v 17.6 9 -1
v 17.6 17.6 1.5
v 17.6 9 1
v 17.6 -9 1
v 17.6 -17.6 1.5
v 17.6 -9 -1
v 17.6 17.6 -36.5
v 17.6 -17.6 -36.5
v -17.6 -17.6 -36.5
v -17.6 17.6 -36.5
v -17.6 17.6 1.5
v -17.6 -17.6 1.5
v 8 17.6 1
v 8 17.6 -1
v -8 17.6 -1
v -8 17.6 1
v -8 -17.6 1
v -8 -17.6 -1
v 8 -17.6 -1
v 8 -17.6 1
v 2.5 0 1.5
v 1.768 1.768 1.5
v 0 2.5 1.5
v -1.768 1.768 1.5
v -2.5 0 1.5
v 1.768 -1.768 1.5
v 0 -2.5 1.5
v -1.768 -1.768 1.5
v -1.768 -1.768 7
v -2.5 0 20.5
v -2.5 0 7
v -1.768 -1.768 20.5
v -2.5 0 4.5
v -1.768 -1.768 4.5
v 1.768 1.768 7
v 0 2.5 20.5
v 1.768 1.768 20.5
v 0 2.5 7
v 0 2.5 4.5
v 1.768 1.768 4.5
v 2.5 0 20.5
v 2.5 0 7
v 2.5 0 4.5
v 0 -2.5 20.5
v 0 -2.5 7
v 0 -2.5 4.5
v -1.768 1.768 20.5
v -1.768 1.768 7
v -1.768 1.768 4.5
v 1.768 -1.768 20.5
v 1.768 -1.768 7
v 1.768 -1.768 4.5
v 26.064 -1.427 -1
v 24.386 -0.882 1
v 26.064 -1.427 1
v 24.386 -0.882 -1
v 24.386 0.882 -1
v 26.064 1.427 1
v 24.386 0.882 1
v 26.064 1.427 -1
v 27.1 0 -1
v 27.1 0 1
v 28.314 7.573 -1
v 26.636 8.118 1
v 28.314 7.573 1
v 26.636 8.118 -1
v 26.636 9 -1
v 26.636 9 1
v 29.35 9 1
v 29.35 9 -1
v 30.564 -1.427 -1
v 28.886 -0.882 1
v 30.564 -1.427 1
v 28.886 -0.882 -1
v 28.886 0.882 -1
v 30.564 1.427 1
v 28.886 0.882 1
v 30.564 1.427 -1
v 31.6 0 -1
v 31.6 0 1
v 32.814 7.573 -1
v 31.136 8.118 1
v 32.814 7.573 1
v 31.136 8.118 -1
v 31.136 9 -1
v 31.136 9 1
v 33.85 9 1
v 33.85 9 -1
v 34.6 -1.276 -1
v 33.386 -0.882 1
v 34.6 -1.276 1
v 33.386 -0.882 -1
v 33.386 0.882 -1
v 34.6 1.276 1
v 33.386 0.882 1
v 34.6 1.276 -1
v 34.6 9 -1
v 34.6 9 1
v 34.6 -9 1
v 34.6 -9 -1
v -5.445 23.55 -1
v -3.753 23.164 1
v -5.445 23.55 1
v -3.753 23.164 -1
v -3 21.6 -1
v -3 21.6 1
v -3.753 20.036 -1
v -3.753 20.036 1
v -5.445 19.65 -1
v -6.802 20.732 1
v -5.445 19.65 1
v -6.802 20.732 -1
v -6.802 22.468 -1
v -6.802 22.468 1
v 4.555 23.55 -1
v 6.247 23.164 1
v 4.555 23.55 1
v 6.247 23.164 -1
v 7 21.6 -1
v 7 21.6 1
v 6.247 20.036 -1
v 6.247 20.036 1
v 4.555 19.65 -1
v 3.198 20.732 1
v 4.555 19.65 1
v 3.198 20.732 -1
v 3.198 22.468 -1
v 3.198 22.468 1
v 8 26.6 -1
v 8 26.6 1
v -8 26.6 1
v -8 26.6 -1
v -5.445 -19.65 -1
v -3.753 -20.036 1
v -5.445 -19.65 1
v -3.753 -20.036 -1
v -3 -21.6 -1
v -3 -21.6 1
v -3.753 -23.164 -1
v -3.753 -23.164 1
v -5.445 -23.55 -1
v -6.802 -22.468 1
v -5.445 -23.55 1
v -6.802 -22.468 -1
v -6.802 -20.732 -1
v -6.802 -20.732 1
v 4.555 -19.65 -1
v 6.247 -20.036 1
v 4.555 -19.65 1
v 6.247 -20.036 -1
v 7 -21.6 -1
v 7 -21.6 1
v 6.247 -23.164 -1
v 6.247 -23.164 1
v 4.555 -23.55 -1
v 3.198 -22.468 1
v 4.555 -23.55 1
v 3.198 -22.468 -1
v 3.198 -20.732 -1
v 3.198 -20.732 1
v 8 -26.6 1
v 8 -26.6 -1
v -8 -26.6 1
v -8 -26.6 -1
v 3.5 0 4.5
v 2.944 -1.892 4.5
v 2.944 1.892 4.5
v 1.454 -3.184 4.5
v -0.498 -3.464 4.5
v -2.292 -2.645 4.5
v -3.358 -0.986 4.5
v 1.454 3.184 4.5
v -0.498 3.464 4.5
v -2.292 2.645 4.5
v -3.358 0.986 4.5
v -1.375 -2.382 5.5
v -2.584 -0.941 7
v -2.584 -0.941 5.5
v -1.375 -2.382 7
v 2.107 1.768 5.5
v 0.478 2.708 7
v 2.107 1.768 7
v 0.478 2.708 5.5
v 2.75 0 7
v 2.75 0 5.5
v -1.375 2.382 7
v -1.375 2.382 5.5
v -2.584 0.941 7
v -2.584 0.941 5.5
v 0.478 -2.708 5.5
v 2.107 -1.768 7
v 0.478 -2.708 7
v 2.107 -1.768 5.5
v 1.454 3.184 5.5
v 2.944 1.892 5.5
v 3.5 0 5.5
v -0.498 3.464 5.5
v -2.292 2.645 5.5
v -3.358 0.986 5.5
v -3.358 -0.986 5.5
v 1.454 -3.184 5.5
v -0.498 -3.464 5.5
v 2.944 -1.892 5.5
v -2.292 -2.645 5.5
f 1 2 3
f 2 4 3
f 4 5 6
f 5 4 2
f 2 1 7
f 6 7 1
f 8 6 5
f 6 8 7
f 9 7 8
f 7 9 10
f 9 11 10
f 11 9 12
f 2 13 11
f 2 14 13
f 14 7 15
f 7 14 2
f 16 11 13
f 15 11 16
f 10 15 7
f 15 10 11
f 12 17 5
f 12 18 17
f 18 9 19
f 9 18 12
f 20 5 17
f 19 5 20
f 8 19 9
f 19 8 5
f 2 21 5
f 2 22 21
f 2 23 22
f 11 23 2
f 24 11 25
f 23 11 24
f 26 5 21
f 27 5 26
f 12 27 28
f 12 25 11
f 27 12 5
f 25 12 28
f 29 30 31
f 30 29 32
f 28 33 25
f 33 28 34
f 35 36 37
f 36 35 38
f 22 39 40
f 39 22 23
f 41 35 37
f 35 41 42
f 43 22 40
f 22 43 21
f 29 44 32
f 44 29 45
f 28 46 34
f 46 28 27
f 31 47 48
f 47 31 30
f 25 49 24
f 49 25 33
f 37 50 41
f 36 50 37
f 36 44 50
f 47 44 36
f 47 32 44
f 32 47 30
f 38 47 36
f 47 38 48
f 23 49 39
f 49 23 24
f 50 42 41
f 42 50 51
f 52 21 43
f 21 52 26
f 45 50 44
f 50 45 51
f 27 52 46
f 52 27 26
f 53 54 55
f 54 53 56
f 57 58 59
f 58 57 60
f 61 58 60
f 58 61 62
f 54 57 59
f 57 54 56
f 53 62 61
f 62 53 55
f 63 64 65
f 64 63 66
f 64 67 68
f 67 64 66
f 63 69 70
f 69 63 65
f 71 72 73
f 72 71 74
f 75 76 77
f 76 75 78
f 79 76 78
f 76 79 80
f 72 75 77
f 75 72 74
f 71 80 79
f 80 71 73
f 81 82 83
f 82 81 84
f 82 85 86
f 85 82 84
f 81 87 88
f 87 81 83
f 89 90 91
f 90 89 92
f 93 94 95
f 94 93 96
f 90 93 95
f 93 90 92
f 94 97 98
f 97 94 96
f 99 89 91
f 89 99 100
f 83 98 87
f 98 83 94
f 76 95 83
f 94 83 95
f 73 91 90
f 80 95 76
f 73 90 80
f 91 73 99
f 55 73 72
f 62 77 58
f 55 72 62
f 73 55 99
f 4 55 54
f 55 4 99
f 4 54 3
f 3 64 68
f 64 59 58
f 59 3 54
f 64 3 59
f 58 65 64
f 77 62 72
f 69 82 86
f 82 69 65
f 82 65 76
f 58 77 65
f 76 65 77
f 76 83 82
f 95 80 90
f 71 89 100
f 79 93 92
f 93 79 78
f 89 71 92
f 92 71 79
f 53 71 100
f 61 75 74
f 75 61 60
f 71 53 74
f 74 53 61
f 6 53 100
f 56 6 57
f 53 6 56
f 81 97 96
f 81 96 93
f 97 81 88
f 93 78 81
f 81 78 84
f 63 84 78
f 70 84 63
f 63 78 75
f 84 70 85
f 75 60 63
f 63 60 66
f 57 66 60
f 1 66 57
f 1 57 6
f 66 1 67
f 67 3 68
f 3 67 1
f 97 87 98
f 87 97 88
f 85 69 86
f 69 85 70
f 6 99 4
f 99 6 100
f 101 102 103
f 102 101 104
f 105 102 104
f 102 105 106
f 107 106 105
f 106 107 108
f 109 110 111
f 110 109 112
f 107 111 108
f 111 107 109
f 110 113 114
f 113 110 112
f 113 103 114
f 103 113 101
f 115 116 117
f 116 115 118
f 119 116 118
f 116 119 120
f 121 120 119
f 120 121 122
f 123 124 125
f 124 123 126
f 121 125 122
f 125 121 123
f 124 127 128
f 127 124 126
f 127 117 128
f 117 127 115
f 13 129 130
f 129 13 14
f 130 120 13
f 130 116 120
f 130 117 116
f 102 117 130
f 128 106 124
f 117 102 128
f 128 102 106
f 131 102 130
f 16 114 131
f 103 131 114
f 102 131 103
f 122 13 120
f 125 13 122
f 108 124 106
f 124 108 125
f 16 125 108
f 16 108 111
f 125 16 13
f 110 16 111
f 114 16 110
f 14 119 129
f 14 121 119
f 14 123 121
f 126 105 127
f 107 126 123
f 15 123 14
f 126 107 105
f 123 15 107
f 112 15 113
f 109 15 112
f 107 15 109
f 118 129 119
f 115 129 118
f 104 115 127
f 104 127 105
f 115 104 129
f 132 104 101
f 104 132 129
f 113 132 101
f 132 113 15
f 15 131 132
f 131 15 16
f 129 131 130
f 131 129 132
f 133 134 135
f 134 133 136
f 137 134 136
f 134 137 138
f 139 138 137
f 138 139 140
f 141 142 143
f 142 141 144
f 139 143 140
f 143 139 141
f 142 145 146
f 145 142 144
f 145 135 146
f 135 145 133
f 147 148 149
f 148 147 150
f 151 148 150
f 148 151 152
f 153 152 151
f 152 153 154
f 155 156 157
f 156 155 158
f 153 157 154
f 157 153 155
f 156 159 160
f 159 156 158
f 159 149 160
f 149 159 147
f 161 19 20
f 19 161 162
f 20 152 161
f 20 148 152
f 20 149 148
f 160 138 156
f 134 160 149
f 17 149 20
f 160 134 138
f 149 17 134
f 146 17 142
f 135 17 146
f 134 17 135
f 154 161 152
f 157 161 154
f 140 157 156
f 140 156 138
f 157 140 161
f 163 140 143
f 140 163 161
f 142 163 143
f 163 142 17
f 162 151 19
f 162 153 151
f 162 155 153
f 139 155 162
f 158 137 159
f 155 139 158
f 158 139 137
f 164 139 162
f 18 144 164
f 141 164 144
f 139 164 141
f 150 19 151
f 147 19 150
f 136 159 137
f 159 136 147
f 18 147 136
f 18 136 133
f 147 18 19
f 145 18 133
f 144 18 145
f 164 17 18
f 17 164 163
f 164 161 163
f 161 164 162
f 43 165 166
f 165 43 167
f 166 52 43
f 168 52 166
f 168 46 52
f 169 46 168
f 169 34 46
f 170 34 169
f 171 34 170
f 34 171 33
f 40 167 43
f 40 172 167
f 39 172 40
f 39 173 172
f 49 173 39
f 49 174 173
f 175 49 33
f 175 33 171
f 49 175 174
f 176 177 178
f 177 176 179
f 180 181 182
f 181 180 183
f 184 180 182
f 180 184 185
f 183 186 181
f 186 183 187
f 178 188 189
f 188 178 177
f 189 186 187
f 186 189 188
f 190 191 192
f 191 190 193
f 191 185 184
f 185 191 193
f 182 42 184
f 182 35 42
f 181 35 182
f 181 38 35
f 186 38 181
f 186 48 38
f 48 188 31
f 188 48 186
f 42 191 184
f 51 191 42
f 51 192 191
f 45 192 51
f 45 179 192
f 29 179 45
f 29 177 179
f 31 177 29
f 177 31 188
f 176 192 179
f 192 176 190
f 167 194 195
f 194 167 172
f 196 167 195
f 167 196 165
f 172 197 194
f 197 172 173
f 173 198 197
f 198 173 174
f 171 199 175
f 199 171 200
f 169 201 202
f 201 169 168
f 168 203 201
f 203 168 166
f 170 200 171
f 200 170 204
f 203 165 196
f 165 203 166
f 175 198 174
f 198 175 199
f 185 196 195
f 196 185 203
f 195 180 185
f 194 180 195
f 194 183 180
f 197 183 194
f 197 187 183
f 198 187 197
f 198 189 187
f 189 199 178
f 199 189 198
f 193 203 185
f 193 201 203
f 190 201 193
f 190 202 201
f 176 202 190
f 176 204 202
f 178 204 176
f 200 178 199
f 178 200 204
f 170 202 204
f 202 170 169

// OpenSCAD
// Parameters
face_width = 35.2; //[17.6:70.4:0.1]
face_thickness = 3.0; //[1.5:6.0:0.1]
body_length = 36.0; //[18.0:72.0:0.1]
body_width = 35.2; //[17.6:70.4:0.1]
body_height = 35.2; //[17.6:70.4:0.1]
shaft_diameter = 5.0; //[2.5:10.0:0.1]
shaft_length = 20.0; //[10.0:40.0:0.1]
mounting_hole_spacing = 26.0; //[13.0:52.0:0.1]
mounting_hole_diameter = 3.5; //[2.0:6.0:0.1]
mounting_hole_depth = 6.0; //[3.0:12.0:0.1]
overlap = 1.0; //[0.5:2.0:0.1]
d_plug_length = 14.0; //[7.0:28.0:0.1]
d_plug_width = 10.0; //[5.0:20.0:0.1]
d_plug_rad = 2.0; //[1.0:4.0:0.1]
aux_plate_thickness = 2.0; //[1.0:5.0:0.1]
grill_width = 18.0; //[9.0:36.0:0.1]
grill_height = 18.0; //[9.0:36.0:0.1]
grill_hole_diameter = 3.0; //[1.5:6.0:0.1]
grill_gap = 2.0; //[1.0:5.0:0.1]
screw_shank_diameter = 3.0; //[2.0:6.0:0.1]
screw_length = 10.0; //[5.0:25.0:0.1]
screw_head_diameter = 5.5; //[3.0:12.0:0.1]
screw_head_height = 2.5; //[1.0:6.0:0.1]
washer_outer_diameter = 7.0; //[4.0:14.0:0.1]
washer_thickness = 1.0; //[0.5:2.5:0.1]
ttrack_plate_width = 16.0; //[8.0:32.0:0.1]
ttrack_plate_height = 10.0; //[5.0:20.0:0.1]
ttrack_hole_diameter = 4.0; //[2.0:8.0:0.1]
ttrack_hole_spacing = 10.0; //[5.0:20.0:0.1]
rail_plate_width = 16.0; //[8.0:32.0:0.1]
rail_plate_height = 10.0; //[5.0:20.0:0.1]
rail_hole_diameter = 4.0; //[2.0:8.0:0.1]
rail_hole_spacing = 10.0; //[5.0:20.0:0.1]

// D Plug D
module d_plug_D() {
  color("Silver") {
    linear_extrude(height=aux_plate_thickness) {
      polygon(points=[
        [-d_plug_length/2, -(d_plug_width/2 - d_plug_rad)],
        [-(d_plug_length/2 - d_plug_rad), -d_plug_width/2],
        [(d_plug_length/2 - d_plug_rad), -d_plug_width/2],
        [d_plug_length/2, -(d_plug_width/2 - d_plug_rad)],
        [d_plug_length/2, (d_plug_width/2 - d_plug_rad)],
        [(d_plug_length/2 - d_plug_rad), d_plug_width/2],
        [-(d_plug_length/2 - d_plug_rad), d_plug_width/2],
        [-d_plug_length/2, (d_plug_width/2 - d_plug_rad)]
      ]);
    }
  }
}

// Grill Hole Positions
module grill_hole_positions() {
  color("Black") {
    for (i = [0:2]) {
      translate([grill_width/4 * i, 0, 0])
        cylinder(r=grill_hole_diameter/2, h=aux_plate_thickness + 2*overlap, center=true);
      translate([grill_width/4 * i + grill_width/8, grill_height/2, 0])
        cylinder(r=grill_hole_diameter/2, h=aux_plate_thickness + 2*overlap, center=true);
    }
  }
}

// Screw and Washer
module screw_and_washer() {
  color("DimGray") {
    union() {
      translate([0, 0, screw_length/2 - overlap])
        cylinder(r=screw_shank_diameter/2, h=screw_length, center=true);
      translate([0, 0, screw_head_height/2 - overlap])
        cylinder(r=screw_head_diameter/2, h=screw_head_height, center=true);
      translate([0, 0, washer_thickness/2 - overlap])
        cylinder(r=washer_outer_diameter/2, h=washer_thickness, center=true);
    }
  }
}

// Ttrack Hole Positions
module ttrack_hole_positions() {
  color("Black") {
    for (i = [-1, 1]) {
      translate([i * ttrack_hole_spacing/2, 0, 0])
        cylinder(r=ttrack_hole_diameter/2, h=aux_plate_thickness + 2*overlap, center=true);
    }
  }
}

// Rail Hole Positions
module rail_hole_positions() {
  color("Black") {
    for (i = [-1, 1]) {
      translate([i * rail_hole_spacing/2, 0, 0])
        cylinder(r=rail_hole_diameter/2, h=aux_plate_thickness + 2*overlap, center=true);
    }
  }
}

// Motor Assembly
module assembly() {
  color("Black") {
    // Motor Body
    translate([0, 0, -(face_thickness/2 + body_length/2 - overlap)])
      cube([body_width, body_height, body_length], center=true);
    // Front Face
    translate([0, 0, 0])
      cube([face_width, face_width, face_thickness], center=true);
    // Shaft
    translate([0, 0, face_thickness/2 + shaft_length/2 - overlap])
      cylinder(r=shaft_diameter/2, h=shaft_length, center=true);
  }
  
  // Mounting Holes
  color("Silver") {
    for (x = [-1, 1], y = [-1, 1]) {
      translate([x * mounting_hole_spacing/2, y * mounting_hole_spacing/2, -(mounting_hole_depth/2 - overlap)])
        cylinder(r=mounting_hole_diameter/2, h=mounting_hole_depth, center=true);
    }
  }
  
  // D Plug D
  translate([0, 0, -(face_thickness/2 + aux_plate_thickness/2 - overlap)])
    d_plug_D();
  
  // Grill Plate with Holes
  translate([face_width/2 + grill_width/2 - overlap, 0, 0])
    difference() {
      cube([grill_width, grill_height, aux_plate_thickness], center=true);
      grill_hole_positions();
    }
  
  // Ttrack Plate with Holes
  translate([0, face_width/2 + ttrack_plate_height/2 - overlap, 0])
    difference() {
      cube([ttrack_plate_width, ttrack_plate_height, aux_plate_thickness], center=true);
      ttrack_hole_positions();
    }
  
  // Rail Plate with Holes
  translate([0, -(face_width/2 + rail_plate_height/2 - overlap), 0])
    difference() {
      cube([rail_plate_width, rail_plate_height, aux_plate_thickness], center=true);
      rail_hole_positions();
    }
  
  // Screw and Washer
  translate([0, 0, face_thickness/2 + screw_length/2 - overlap])
    screw_and_washer();
}

assembly();
